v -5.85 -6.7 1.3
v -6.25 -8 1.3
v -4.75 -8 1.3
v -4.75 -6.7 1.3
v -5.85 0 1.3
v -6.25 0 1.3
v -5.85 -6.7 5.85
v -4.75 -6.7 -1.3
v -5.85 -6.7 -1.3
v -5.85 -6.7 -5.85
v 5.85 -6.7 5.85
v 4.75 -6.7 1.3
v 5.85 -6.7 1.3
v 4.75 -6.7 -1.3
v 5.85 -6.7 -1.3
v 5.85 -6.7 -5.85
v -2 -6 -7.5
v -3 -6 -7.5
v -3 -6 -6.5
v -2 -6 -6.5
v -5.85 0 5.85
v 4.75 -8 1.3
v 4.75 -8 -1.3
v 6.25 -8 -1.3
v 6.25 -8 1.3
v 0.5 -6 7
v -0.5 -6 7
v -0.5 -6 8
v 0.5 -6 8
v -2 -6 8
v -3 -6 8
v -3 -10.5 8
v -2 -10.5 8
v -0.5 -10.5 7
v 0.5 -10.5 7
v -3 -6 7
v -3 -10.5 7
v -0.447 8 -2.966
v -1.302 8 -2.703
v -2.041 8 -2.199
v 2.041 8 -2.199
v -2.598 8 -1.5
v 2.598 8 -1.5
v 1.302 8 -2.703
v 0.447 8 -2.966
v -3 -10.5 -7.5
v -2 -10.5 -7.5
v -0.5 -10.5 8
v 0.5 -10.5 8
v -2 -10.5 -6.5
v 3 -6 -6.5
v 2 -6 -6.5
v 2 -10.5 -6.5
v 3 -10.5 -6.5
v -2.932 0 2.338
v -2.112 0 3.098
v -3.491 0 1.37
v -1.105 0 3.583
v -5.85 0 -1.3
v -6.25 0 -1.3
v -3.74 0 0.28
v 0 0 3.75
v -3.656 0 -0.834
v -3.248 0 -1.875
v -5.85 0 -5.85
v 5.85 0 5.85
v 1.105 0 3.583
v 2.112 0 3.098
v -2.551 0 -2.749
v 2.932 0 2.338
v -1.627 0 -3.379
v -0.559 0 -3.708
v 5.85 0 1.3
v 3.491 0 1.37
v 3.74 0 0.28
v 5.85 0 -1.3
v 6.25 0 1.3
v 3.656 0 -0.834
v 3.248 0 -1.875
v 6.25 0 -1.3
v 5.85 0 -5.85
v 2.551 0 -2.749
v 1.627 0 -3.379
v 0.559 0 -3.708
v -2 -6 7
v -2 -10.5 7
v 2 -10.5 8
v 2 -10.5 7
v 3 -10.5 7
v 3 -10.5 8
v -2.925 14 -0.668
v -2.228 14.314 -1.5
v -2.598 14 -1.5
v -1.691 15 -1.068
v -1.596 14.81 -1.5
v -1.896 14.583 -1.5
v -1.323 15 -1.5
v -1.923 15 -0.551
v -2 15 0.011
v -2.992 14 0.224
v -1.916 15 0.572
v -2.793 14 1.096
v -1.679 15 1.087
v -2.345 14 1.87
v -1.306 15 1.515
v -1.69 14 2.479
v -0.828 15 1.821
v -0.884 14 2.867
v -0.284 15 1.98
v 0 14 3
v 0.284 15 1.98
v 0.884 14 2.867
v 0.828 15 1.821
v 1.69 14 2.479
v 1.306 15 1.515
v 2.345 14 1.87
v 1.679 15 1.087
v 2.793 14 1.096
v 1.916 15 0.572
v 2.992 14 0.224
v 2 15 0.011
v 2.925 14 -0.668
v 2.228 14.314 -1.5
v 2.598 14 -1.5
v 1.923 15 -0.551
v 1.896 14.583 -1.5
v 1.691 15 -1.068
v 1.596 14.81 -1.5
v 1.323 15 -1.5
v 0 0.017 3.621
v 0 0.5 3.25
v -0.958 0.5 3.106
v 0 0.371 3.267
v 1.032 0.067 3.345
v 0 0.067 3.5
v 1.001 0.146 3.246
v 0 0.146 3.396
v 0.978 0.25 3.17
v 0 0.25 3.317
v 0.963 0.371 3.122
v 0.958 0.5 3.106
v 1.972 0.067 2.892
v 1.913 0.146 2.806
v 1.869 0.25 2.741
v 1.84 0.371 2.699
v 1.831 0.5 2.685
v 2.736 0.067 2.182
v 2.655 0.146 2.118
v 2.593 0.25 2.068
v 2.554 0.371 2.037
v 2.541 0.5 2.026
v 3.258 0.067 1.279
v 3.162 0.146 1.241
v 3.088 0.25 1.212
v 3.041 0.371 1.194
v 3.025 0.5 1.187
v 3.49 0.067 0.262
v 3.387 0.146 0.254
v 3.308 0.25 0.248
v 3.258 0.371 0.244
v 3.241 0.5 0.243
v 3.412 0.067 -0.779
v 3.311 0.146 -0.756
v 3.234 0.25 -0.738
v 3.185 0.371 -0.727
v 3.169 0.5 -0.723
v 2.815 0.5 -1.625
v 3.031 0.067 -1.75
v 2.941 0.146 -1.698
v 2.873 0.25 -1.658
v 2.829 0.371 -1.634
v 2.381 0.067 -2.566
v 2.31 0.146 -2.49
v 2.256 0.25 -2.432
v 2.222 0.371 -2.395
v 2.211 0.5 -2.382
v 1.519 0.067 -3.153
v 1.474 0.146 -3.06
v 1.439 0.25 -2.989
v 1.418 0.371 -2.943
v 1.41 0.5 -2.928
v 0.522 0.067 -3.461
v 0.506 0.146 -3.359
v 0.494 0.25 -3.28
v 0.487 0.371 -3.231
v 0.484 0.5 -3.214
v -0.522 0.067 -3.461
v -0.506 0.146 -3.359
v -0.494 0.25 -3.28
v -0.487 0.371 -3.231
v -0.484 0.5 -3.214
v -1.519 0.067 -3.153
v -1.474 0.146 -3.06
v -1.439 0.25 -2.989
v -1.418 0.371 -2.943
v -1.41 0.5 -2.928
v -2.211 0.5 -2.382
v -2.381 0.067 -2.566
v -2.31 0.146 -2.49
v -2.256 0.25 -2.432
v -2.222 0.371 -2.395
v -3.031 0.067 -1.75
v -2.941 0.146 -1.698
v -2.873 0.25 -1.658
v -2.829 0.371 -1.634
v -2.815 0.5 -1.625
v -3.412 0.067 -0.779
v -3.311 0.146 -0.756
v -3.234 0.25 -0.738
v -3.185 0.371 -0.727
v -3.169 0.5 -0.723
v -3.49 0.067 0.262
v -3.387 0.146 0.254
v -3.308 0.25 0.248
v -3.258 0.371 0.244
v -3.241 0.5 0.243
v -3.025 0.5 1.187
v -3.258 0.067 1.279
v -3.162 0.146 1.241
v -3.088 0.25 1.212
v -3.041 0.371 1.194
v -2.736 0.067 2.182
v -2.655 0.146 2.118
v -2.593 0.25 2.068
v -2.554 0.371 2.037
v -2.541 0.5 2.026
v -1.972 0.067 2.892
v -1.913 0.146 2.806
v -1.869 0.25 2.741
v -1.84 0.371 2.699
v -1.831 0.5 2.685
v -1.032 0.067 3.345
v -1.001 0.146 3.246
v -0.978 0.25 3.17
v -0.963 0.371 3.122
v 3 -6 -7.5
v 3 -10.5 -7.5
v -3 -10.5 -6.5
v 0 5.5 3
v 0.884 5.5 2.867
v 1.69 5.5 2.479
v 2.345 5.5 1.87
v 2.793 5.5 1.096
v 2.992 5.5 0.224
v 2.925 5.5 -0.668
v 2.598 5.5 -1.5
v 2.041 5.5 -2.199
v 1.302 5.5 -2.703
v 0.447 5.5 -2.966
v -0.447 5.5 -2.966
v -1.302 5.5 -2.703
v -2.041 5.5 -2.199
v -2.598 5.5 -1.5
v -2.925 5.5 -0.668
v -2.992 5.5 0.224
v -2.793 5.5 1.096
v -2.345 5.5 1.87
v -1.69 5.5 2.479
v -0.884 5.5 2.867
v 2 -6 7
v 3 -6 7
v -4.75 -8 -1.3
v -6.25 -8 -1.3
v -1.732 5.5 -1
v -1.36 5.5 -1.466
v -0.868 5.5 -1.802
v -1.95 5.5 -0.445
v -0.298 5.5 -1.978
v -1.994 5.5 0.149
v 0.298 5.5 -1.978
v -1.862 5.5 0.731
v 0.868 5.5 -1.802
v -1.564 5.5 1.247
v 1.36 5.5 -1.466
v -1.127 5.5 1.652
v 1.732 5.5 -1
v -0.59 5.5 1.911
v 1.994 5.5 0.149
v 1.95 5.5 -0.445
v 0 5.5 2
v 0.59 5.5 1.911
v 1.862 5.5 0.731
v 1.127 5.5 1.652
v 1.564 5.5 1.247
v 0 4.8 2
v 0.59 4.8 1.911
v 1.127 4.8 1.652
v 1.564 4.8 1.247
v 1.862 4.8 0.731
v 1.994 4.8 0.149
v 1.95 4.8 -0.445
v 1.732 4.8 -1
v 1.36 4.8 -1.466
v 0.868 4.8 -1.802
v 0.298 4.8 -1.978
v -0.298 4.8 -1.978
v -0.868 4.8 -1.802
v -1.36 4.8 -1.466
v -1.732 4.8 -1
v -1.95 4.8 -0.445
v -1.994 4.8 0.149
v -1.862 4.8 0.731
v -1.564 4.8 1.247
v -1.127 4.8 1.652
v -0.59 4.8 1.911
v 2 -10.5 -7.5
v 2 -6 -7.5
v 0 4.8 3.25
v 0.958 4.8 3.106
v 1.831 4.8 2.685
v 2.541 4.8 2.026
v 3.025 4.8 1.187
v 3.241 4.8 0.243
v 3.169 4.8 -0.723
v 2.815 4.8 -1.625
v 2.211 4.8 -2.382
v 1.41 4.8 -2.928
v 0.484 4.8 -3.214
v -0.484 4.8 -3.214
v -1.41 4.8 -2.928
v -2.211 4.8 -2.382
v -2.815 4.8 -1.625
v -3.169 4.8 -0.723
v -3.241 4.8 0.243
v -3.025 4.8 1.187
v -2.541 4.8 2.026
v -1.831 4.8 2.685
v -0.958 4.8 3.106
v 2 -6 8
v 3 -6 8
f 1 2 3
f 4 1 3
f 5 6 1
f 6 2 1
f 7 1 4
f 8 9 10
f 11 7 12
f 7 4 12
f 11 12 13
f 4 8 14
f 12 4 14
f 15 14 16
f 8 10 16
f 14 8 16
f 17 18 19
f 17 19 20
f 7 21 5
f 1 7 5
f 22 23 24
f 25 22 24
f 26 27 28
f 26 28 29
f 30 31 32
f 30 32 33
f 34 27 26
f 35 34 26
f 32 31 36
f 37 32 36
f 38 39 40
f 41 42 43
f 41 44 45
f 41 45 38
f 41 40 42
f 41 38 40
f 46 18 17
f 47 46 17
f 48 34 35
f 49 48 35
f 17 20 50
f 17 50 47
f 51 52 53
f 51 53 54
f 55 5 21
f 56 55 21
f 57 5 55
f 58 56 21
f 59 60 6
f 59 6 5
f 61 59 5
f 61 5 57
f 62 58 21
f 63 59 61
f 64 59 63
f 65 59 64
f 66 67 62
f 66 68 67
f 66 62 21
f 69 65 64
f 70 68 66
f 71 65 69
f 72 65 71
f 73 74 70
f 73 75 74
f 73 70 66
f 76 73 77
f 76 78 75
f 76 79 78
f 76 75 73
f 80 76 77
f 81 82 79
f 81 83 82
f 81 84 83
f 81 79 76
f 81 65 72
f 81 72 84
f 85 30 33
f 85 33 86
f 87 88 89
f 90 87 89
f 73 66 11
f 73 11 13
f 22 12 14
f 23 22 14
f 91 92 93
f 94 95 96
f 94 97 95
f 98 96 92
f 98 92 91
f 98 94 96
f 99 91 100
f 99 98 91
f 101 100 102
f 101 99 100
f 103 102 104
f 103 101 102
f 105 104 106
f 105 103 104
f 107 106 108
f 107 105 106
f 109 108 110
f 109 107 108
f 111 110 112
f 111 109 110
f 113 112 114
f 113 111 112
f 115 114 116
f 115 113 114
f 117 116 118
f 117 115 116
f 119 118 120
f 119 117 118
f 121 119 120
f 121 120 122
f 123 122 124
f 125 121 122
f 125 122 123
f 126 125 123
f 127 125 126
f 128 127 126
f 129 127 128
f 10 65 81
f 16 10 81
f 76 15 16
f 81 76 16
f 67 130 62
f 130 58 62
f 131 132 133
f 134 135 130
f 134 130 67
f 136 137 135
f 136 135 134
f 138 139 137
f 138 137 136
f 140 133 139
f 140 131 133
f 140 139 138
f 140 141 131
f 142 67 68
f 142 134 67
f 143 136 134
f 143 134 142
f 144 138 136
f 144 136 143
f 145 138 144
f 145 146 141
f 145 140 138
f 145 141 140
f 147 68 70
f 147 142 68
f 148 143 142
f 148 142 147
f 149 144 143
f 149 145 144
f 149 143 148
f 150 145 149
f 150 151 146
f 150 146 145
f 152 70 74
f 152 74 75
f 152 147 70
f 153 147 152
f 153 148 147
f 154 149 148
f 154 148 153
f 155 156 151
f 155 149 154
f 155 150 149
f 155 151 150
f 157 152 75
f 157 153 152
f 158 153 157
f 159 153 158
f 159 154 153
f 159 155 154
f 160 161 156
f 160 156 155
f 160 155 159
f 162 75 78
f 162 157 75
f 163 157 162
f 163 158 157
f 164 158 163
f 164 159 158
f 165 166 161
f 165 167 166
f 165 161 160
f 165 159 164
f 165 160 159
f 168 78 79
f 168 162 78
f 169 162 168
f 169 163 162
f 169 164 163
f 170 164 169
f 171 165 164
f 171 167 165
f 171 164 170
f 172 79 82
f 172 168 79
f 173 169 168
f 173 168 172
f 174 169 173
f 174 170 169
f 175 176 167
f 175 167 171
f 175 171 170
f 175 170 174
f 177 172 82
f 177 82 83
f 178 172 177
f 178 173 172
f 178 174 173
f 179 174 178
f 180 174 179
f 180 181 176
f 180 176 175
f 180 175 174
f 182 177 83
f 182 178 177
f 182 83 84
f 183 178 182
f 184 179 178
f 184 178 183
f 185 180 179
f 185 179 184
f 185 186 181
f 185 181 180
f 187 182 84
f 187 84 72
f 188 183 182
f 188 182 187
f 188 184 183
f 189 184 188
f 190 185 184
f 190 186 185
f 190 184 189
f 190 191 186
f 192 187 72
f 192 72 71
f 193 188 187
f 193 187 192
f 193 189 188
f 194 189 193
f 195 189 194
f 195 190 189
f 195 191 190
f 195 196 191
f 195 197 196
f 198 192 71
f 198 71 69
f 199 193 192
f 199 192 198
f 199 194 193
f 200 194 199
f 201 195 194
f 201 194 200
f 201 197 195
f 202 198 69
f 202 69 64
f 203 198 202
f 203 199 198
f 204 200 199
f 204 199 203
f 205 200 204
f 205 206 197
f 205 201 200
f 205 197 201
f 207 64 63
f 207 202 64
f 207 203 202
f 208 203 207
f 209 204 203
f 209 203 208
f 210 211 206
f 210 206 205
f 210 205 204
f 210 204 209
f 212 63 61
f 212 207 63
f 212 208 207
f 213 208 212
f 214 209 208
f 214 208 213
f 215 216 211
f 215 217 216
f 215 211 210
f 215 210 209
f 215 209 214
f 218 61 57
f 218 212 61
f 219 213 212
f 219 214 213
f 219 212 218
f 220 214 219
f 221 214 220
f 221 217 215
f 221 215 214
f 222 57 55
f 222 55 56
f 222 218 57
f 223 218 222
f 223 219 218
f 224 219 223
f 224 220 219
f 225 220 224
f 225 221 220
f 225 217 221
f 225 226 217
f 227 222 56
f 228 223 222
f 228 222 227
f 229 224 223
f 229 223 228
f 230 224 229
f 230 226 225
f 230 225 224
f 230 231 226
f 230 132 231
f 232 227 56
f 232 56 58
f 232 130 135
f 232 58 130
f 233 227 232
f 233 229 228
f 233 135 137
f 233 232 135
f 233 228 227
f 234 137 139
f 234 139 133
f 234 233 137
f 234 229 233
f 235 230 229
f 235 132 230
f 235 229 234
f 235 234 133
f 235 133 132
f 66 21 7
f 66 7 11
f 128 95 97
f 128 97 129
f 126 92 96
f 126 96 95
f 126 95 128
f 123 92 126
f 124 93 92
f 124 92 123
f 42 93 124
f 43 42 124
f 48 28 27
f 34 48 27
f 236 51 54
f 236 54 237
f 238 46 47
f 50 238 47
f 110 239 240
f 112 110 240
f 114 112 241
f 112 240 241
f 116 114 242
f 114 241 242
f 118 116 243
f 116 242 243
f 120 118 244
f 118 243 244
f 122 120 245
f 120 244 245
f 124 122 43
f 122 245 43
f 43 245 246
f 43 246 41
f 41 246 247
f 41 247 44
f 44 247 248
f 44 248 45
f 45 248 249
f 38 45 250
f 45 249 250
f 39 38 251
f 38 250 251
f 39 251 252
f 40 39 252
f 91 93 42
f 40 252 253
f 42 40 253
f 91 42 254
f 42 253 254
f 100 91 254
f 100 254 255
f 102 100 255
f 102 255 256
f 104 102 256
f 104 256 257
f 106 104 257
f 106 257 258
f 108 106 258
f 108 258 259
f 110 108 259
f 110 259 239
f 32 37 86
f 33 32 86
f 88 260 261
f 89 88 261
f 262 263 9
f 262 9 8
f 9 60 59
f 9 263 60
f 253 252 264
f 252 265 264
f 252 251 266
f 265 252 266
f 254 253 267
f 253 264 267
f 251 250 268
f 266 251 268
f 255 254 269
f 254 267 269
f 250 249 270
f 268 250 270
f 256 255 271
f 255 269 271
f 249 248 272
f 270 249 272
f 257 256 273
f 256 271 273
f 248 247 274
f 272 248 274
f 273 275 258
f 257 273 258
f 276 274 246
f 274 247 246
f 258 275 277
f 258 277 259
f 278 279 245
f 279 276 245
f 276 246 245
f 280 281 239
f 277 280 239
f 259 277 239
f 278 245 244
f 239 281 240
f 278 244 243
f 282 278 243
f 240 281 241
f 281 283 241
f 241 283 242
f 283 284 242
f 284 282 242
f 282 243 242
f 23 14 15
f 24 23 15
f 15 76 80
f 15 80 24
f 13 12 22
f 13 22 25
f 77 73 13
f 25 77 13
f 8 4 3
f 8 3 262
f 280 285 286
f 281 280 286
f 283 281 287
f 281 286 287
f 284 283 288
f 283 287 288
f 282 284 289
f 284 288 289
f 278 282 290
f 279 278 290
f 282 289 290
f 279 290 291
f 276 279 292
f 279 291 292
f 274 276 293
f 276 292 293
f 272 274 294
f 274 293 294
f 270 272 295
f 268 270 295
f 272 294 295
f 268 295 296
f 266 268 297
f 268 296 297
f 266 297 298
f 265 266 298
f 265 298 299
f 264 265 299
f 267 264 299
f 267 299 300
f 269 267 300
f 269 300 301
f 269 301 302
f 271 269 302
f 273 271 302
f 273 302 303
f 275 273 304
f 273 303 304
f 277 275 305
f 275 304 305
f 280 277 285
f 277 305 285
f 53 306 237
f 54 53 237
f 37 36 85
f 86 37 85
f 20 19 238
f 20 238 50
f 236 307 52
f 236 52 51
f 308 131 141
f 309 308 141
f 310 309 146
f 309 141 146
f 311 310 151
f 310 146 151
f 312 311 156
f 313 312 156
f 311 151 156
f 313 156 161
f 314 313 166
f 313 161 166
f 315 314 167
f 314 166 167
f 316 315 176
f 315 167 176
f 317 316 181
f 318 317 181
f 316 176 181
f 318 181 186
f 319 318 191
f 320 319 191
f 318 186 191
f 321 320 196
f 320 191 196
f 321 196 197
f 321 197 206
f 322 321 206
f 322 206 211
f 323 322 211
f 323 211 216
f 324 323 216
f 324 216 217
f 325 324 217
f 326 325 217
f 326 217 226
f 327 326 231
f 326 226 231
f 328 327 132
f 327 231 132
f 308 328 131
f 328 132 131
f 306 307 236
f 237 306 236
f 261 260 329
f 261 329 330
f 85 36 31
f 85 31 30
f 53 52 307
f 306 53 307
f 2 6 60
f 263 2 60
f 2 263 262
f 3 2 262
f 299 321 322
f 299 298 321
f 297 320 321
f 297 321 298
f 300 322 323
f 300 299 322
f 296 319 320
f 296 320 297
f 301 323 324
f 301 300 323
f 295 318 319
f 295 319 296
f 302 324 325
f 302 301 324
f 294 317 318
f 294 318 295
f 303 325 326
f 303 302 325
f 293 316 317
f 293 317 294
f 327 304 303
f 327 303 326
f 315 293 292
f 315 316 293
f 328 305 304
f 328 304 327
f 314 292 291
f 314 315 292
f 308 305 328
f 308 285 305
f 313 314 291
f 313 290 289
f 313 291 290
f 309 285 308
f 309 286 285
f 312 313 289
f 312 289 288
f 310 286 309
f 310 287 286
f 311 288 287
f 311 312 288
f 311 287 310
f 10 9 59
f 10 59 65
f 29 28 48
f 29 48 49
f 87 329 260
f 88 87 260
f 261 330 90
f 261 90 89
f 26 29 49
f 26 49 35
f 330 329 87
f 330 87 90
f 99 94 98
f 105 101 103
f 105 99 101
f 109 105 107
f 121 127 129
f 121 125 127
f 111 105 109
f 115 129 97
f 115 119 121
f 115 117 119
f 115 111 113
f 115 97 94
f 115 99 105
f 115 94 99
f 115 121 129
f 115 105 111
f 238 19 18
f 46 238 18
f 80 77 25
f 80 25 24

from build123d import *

# Parameters (mm, degrees)
SKETCH1_W             = 11.7
SKETCH1_H             = 11.7
BOSS_EXTRUDE1_DEPTH   = 6.7
SKETCH2_R             = 3.25
BOSS_EXTRUDE2_DEPTH   = 4.8
FILLET1_R             = 0.5
SKETCH3_R             = 2
BOSS_EXTRUDE3_DEPTH   = 0.7
SKETCH4_R             = 3
BOSS_EXTRUDE4_DEPTH   = 9.5
CUT_EXTRUDE1_START    = -7
CUT_EXTRUDE1_DEPTH    = 7
BOSS_EXTRUDE5_START   = -6
SKETCH6_W             = 1
SKETCH6_H             = 1
BOSS_EXTRUDE5_DEPTH   = 4.5
BOSS_EXTRUDE5_2_DEPTH = 4.5
BOSS_EXTRUDE5_3_DEPTH = 4.5
BOSS_EXTRUDE5_4_DEPTH = 4.5
BOSS_EXTRUDE5_5_DEPTH = 4.5
SKETCH8_W             = 1.5
SKETCH8_H             = 2.6
BOSS_EXTRUDE6_DEPTH   = 8
CHAMFER1_SIZE         = 1


with BuildPart() as part:
    # Sketch1 → Boss-Extrude1 (new body)
    with BuildSketch(Plane(origin=(0, 0, 0), x_dir=(1, 0, 0), z_dir=(0, 1, 0))):
        Rectangle(SKETCH1_W, SKETCH1_H)
    extrude(amount=-BOSS_EXTRUDE1_DEPTH)

    # Sketch2 → Boss-Extrude2 (add)
    with BuildSketch(Plane(origin=(0, 0, 0), x_dir=(1, 0, 0), z_dir=(0, 1, 0))):
        with Locations(Location((0, 0, 0), (0, 0, 270))):
            Circle(SKETCH2_R)
    extrude(amount=BOSS_EXTRUDE2_DEPTH)

    # Fillet1
    fillet1_edges = [part.edges().sort_by_distance(p)[0] for p in [
        (0, 0, -3.25),
    ]]
    fillet(fillet1_edges, radius=FILLET1_R)

    # Sketch3 → Boss-Extrude3 (add)
    with BuildSketch(Plane(origin=(0, 4.8, 0), x_dir=(1, 0, 0), z_dir=(0, 1, 0))):
        with Locations(Location((0, 0, 0), (0, 0, 270))):
            Circle(SKETCH3_R)
    extrude(amount=BOSS_EXTRUDE3_DEPTH)

    # Sketch4 → Boss-Extrude4 (add)
    with BuildSketch(Plane(origin=(0, 5.5, 0), x_dir=(1, 0, 0), z_dir=(0, 1, 0))):
        with Locations(Location((0, 0, 0), (0, 0, 270))):
            Circle(SKETCH4_R)
    extrude(amount=BOSS_EXTRUDE4_DEPTH)

    # Sketch5 → Cut-Extrude1 (cut)
    with BuildSketch(Plane(origin=(0, 15, 0), x_dir=(1, 0, 0), z_dir=(0, 1, 0)).offset(CUT_EXTRUDE1_START)):
        with BuildLine():
            Line((-2.598076211, 1.5), (2.598076211, 1.5))
            ThreePointArc((2.598076211, 1.5), (0, 3), (-2.598076211, 1.5))
        make_face()
    extrude(amount=CUT_EXTRUDE1_DEPTH, mode=Mode.SUBTRACT)

    # Sketch8 → Boss-Extrude6 (add)
    with BuildSketch(Plane(origin=(0, 0, 0), x_dir=(1, 0, 0), z_dir=(0, 1, 0))):
        with Locations((-5.5, 0)):
            Rectangle(SKETCH8_W, SKETCH8_H)
        with Locations((5.5, 0)):
            Rectangle(SKETCH8_W, SKETCH8_H)
    extrude(amount=-BOSS_EXTRUDE6_DEPTH)

    # Chamfer1
    chamfer1_edges = [part.edges().sort_by_distance(p)[0] for p in [
        (2.598076211, 15, 1.5),
    ]]
    chamfer(chamfer1_edges, length=CHAMFER1_SIZE)


with BuildPart() as body_2:
    # Sketch6 → Boss-Extrude5 (new body)
    with BuildSketch(Plane(origin=(0, 0, 0), x_dir=(1, 0, 0), z_dir=(0, 1, 0)).offset(BOSS_EXTRUDE5_START)):
        with Locations((-2.5, 7)):
            Rectangle(SKETCH6_W, SKETCH6_H)
    extrude(amount=-BOSS_EXTRUDE5_DEPTH)


with BuildPart() as body_3:
    # Sketch6 → Boss-Extrude5 2 (new body)
    with BuildSketch(Plane(origin=(0, 0, 0), x_dir=(1, 0, 0), z_dir=(0, 1, 0)).offset(BOSS_EXTRUDE5_START)):
        with Locations((2.5, 7)):
            Rectangle(SKETCH6_W, SKETCH6_H)
    extrude(amount=-BOSS_EXTRUDE5_2_DEPTH)


with BuildPart() as body_4:
    # Sketch6 → Boss-Extrude5 3 (new body)
    with BuildSketch(Plane(origin=(0, 0, 0), x_dir=(1, 0, 0), z_dir=(0, 1, 0)).offset(BOSS_EXTRUDE5_START)):
        with Locations((0, -7.5)):
            Rectangle(SKETCH6_W, SKETCH6_H)
    extrude(amount=-BOSS_EXTRUDE5_3_DEPTH)


with BuildPart() as body_5:
    # Sketch6 → Boss-Extrude5 4 (new body)
    with BuildSketch(Plane(origin=(0, 0, 0), x_dir=(1, 0, 0), z_dir=(0, 1, 0)).offset(BOSS_EXTRUDE5_START)):
        with Locations((2.5, -7.5)):
            Rectangle(SKETCH6_W, SKETCH6_H)
    extrude(amount=-BOSS_EXTRUDE5_4_DEPTH)


with BuildPart() as body_6:
    # Sketch6 → Boss-Extrude5 5 (new body)
    with BuildSketch(Plane(origin=(0, 0, 0), x_dir=(1, 0, 0), z_dir=(0, 1, 0)).offset(BOSS_EXTRUDE5_START)):
        with Locations((-2.5, -7.5)):
            Rectangle(SKETCH6_W, SKETCH6_H)
    extrude(amount=-BOSS_EXTRUDE5_5_DEPTH)


solid = Compound([part.part, body_2.part, body_3.part, body_4.part, body_5.part, body_6.part])
